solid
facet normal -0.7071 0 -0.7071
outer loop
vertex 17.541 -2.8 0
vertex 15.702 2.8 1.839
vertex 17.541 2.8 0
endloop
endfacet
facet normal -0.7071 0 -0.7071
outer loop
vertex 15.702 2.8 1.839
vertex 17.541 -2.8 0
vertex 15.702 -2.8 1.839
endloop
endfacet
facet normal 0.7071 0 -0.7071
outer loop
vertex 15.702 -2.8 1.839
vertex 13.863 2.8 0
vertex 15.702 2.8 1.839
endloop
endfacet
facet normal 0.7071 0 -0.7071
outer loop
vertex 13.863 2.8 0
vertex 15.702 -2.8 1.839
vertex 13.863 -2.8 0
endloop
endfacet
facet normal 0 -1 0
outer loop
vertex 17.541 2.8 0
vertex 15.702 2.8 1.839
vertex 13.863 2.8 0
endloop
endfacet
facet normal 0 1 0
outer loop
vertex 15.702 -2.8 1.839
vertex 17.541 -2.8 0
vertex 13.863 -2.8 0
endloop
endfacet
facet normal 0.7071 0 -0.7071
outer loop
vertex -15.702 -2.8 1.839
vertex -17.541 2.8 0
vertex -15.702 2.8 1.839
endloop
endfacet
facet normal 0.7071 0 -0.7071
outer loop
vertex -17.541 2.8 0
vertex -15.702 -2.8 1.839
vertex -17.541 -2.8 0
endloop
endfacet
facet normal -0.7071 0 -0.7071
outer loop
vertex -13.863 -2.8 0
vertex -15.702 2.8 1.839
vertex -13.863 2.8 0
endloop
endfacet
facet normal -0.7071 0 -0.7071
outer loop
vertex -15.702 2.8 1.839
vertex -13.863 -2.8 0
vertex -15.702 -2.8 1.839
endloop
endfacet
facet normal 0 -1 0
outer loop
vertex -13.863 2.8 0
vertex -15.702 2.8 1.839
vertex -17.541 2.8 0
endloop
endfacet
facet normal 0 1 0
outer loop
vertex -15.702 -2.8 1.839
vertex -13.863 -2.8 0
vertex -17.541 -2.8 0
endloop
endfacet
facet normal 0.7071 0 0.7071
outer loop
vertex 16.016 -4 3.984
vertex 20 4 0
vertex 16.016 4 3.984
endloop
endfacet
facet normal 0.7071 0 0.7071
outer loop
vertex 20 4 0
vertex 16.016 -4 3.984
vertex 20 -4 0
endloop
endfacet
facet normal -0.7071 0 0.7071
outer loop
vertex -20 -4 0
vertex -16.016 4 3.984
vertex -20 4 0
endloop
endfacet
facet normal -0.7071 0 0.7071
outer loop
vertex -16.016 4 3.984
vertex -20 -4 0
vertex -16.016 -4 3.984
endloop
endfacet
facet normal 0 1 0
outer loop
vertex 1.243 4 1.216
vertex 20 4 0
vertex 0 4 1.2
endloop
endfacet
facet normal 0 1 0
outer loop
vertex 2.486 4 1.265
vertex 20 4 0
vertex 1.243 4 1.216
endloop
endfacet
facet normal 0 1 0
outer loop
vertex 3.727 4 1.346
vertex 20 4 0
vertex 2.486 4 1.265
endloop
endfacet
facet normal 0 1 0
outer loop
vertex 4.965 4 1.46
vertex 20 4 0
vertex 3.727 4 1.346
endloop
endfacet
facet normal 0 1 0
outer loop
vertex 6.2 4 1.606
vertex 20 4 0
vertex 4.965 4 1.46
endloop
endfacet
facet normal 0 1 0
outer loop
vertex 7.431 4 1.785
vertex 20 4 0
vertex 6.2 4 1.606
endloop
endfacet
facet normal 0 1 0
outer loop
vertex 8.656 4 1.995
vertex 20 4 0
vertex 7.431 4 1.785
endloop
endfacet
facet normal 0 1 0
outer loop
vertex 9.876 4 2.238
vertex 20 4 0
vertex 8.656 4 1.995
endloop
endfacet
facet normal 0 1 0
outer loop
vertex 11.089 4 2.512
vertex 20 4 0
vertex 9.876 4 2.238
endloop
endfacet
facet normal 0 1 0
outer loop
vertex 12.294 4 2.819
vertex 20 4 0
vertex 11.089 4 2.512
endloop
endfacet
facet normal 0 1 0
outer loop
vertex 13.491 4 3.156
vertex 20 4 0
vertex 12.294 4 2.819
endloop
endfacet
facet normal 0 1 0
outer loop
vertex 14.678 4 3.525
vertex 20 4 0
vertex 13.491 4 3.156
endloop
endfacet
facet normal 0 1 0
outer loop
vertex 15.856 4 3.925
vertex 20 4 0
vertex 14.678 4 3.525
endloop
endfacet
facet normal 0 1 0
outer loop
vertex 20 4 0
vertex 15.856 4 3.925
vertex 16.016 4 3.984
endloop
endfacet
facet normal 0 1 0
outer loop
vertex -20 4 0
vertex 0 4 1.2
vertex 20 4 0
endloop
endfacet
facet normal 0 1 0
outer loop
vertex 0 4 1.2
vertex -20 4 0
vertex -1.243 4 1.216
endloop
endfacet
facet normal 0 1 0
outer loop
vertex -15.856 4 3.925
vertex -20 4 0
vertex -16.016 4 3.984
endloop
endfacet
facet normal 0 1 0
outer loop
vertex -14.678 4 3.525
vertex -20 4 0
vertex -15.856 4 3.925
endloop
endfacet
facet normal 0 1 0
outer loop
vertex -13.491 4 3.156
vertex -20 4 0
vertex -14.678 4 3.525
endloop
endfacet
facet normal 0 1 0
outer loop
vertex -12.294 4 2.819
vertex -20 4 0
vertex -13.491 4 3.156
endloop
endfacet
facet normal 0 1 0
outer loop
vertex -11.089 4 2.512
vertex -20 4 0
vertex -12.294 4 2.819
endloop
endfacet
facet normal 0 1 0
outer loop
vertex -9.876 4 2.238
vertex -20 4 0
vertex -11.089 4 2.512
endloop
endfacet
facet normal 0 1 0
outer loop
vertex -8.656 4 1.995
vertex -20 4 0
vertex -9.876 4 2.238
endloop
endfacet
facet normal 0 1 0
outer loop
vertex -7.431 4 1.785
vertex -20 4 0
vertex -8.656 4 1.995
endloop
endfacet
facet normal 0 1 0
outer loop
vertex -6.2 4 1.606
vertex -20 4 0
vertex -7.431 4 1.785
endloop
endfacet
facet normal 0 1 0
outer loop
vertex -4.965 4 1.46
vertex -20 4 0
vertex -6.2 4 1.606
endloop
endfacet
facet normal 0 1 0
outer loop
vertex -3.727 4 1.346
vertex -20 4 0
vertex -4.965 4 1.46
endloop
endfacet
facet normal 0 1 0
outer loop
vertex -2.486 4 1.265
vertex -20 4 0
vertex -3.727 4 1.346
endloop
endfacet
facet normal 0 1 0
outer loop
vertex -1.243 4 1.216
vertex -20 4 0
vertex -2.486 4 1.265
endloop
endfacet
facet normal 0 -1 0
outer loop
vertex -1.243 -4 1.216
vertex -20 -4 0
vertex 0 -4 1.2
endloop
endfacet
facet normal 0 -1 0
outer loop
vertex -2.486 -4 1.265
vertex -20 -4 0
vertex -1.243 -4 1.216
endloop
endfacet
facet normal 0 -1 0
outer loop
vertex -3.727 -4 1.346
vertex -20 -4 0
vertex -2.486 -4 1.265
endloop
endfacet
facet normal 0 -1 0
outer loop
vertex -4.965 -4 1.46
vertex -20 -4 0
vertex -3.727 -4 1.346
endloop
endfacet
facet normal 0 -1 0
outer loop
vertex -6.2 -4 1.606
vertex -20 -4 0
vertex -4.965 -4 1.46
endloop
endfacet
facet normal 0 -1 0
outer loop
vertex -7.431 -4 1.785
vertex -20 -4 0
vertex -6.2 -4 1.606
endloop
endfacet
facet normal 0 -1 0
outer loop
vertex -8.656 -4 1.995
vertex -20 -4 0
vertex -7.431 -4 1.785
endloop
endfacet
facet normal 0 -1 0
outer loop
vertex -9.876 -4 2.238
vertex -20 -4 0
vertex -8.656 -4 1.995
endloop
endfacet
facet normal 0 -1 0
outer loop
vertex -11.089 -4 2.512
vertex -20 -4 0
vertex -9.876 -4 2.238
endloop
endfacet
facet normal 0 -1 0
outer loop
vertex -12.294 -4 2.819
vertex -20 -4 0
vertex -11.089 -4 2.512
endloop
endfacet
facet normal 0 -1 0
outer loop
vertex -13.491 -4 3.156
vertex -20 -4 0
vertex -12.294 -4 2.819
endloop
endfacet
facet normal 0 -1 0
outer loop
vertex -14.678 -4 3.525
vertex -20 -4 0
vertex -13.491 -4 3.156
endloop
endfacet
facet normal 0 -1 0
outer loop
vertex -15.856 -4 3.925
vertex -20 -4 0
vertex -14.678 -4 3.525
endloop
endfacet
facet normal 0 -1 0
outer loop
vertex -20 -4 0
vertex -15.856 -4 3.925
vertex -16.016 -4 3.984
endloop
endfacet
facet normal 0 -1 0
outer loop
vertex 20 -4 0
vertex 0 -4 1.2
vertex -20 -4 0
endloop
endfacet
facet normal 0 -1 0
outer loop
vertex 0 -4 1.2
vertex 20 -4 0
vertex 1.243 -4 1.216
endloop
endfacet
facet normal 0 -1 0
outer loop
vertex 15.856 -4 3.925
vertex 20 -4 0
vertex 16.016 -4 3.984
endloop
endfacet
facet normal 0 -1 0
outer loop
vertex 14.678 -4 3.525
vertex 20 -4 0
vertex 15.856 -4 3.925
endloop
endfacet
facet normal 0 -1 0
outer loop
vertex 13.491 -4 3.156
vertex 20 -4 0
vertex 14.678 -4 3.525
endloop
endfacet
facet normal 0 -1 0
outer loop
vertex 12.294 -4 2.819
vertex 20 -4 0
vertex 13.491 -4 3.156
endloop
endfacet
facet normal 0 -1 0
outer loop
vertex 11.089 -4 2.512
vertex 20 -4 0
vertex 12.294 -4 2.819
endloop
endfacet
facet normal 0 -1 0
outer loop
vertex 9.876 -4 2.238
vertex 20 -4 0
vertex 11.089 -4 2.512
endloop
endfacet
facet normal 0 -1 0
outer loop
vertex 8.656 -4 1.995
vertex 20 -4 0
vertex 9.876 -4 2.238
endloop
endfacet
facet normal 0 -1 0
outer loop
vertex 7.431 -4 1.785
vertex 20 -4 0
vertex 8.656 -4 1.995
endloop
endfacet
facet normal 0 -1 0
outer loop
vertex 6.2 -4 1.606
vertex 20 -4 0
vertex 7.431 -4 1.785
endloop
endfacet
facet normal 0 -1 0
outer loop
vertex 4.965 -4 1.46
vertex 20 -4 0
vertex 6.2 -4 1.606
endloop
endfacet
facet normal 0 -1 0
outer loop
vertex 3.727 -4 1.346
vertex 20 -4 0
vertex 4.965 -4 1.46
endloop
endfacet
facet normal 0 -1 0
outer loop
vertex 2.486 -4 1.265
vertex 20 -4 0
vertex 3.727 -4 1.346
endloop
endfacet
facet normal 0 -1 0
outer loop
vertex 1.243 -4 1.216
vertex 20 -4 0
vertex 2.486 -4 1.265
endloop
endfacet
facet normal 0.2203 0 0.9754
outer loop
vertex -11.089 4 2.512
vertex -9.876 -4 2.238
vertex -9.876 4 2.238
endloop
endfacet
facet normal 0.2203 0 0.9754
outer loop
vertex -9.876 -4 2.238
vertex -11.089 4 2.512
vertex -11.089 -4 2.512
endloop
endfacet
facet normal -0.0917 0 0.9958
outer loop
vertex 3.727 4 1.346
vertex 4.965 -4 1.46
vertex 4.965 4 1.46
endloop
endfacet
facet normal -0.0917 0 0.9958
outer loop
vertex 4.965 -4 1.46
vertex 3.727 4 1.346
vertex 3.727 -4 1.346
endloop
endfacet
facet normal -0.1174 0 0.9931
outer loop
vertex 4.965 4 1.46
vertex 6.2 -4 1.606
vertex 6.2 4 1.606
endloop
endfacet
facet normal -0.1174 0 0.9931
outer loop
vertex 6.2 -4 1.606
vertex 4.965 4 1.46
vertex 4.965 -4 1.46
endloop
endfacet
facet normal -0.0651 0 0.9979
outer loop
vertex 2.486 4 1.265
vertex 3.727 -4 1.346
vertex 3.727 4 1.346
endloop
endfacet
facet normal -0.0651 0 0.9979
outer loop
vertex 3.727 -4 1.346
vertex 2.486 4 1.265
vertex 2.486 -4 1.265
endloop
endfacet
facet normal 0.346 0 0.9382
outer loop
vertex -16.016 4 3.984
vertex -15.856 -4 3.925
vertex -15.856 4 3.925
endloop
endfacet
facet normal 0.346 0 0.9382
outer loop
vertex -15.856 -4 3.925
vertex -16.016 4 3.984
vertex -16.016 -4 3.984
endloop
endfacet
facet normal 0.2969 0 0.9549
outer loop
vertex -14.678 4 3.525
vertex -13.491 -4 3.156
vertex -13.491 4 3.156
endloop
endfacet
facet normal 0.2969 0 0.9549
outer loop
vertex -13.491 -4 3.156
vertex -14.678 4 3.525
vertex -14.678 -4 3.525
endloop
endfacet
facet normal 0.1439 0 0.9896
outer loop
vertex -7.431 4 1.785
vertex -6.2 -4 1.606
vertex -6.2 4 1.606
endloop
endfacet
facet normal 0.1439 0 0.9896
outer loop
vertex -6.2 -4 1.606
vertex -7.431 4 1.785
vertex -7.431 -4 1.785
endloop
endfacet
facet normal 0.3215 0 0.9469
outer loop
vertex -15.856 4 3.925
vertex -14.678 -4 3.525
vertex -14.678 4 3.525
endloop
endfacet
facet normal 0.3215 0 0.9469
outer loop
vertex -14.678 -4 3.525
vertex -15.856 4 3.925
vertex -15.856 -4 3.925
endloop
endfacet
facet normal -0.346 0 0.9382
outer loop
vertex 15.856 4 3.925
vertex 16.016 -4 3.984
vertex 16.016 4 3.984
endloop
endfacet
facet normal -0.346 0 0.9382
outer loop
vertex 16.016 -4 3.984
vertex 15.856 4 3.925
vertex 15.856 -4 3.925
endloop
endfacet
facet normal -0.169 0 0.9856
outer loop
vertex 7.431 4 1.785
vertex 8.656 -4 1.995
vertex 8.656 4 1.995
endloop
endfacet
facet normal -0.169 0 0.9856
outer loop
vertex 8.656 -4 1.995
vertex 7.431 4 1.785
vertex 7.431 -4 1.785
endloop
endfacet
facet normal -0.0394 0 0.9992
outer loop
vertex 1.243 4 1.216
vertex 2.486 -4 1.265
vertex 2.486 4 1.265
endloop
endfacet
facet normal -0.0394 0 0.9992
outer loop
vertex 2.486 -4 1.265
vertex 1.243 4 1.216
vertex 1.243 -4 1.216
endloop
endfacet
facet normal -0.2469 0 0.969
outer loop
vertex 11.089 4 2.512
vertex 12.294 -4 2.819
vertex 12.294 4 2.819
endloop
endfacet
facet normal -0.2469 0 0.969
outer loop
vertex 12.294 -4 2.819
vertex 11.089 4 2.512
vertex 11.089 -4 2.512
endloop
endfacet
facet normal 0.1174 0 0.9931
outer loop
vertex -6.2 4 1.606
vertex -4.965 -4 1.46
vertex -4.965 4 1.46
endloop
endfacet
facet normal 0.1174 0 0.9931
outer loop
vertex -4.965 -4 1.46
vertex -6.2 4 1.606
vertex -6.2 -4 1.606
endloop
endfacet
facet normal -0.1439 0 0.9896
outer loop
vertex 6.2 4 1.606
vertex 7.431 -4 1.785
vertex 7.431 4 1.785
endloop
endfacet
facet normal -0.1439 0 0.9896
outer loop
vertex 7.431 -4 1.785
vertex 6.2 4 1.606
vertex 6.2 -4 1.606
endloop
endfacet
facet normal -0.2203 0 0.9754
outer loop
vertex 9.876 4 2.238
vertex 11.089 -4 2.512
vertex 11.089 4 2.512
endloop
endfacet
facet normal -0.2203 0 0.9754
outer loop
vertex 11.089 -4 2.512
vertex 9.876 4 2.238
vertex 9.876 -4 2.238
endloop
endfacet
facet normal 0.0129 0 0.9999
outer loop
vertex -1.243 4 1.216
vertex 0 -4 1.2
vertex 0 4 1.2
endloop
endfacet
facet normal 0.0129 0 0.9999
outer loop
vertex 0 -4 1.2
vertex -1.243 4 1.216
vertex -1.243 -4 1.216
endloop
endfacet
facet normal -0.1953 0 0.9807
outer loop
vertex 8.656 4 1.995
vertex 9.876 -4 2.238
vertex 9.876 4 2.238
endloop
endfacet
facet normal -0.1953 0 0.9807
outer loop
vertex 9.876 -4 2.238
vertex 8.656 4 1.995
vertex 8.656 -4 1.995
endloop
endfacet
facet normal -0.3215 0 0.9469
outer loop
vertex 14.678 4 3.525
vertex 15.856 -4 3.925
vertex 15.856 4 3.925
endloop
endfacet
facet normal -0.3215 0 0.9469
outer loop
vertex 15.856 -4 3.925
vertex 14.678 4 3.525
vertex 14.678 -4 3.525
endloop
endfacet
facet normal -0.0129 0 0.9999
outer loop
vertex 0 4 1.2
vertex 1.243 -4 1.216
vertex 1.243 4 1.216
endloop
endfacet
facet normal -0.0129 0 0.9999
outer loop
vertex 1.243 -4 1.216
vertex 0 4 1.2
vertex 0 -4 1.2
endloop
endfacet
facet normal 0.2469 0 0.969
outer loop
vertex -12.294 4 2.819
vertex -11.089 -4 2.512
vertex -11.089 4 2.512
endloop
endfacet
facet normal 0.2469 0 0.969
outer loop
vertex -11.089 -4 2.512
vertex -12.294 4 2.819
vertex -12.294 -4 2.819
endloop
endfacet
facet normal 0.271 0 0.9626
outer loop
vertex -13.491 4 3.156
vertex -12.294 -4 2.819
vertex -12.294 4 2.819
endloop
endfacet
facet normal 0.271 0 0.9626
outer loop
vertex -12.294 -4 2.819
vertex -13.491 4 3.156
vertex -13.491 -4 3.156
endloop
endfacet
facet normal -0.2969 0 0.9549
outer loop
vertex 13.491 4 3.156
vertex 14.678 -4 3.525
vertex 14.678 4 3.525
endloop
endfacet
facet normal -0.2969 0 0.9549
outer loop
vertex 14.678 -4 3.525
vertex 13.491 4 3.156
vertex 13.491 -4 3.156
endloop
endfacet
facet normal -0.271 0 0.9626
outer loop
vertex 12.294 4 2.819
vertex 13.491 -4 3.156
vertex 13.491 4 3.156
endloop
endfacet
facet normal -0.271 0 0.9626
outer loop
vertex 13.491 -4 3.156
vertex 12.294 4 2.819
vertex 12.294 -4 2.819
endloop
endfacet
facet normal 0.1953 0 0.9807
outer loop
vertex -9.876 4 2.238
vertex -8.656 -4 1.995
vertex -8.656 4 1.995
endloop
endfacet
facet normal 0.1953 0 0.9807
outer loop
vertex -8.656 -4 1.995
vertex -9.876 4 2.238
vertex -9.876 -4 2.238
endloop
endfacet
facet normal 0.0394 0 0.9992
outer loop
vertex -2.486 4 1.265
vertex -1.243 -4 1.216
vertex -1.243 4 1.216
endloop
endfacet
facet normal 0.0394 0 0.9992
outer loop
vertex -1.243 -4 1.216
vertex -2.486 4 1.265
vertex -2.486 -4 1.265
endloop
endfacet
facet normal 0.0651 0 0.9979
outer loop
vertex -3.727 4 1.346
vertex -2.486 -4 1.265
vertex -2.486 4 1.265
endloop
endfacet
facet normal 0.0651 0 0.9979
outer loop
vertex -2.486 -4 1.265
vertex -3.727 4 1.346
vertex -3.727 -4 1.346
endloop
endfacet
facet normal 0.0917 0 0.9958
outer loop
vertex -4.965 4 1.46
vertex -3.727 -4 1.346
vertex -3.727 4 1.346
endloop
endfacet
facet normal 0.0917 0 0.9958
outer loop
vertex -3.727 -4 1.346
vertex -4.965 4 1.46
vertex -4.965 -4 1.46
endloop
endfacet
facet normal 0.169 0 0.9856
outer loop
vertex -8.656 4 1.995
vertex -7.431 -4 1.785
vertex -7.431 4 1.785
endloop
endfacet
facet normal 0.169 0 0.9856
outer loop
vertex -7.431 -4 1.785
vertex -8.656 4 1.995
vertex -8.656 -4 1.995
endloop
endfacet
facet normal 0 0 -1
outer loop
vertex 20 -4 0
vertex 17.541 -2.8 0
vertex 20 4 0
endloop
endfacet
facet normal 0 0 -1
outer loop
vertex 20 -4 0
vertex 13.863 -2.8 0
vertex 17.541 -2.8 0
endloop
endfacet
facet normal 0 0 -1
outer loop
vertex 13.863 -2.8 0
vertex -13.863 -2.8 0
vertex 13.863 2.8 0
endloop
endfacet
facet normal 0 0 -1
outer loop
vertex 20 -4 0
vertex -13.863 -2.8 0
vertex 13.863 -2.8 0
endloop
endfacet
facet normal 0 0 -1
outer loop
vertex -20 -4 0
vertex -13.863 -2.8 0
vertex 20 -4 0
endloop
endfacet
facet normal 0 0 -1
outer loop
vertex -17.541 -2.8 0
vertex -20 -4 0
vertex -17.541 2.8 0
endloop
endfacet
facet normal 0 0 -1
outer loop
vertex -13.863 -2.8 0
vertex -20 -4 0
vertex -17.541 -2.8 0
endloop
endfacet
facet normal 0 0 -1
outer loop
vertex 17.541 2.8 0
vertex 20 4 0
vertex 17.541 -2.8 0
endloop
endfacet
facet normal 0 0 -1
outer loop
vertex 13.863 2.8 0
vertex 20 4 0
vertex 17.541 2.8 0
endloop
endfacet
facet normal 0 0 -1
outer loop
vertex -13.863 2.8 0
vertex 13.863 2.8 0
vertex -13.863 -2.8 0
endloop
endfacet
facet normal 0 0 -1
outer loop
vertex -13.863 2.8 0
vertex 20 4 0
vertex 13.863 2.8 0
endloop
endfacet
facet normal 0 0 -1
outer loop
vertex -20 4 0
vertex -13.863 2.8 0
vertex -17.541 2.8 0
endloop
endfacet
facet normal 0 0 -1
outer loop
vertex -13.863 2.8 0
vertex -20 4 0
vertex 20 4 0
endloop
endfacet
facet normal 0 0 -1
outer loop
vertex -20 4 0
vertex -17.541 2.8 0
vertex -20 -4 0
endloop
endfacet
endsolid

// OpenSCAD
// Wheel chock for model display
// includes option for recess to underside for BluTak
// By misterC @ thingiverse

// input parameters
// Diameter of wheel to be chocked
dia=95;
// Width of chock required
width = 8;
// Length of chock required
chock = 40;
// Thickness of walls (best as multiple of extruder diameter)
wall_thick = 1.2;
// Cutouts required?
cutout = true;

/*	[Hidden]	*/

//working variables
// wheel radius
rad = dia/2;
// block length for chock diagonal
sides = pythag(chock/2);
// radius of under edge of chock
fullrad = rad + wall_thick;
cutout_warning = "Cutout is very small";

c = chock/2 - pythag(wall_thick);
D = 2*pow(fullrad,2) - pow(fullrad-c,2);
Y1 = 1/2 * (c + fullrad + sqrt(D));
Y2 = 1/2 * (c + fullrad - sqrt(D));
// we need the smaller value of Y
Y=(Y1>Y2)?Y2:Y1;

cutside = pythag(Y);
if (cutside<wall_thick) echo (cutout_warning);
cutmiddle = c - Y;

// System variables
$fn = 50;

// Progam here, calls modules below
intersection()
{
	// z=0 cutoff
	cylinder(d=dia,h=rad);
	difference()
	{
		// chock body
		toblerone(sides,width);

		// wheel
		translate([0,0,fullrad]) rotate([90,0,0]) cylinder(d=dia,h=2*width,center=true,$fn=240);
		// blutack cutouts
		if (cutout) mirrorme([1,0,0]) translate([cutmiddle,0,0]) toblerone(Y,width-2*wall_thick);
	}
}


module toblerone(length,depth)
{
	rotate([0,45,0,0]) cube([length,depth,length],center=true);
}

module mirrorme(axis)
// produces two items, mirrored in [axis]
{
    children();
    mirror(axis) children();
}

function pythag(length) = sqrt(2*(pow(length,2)));
